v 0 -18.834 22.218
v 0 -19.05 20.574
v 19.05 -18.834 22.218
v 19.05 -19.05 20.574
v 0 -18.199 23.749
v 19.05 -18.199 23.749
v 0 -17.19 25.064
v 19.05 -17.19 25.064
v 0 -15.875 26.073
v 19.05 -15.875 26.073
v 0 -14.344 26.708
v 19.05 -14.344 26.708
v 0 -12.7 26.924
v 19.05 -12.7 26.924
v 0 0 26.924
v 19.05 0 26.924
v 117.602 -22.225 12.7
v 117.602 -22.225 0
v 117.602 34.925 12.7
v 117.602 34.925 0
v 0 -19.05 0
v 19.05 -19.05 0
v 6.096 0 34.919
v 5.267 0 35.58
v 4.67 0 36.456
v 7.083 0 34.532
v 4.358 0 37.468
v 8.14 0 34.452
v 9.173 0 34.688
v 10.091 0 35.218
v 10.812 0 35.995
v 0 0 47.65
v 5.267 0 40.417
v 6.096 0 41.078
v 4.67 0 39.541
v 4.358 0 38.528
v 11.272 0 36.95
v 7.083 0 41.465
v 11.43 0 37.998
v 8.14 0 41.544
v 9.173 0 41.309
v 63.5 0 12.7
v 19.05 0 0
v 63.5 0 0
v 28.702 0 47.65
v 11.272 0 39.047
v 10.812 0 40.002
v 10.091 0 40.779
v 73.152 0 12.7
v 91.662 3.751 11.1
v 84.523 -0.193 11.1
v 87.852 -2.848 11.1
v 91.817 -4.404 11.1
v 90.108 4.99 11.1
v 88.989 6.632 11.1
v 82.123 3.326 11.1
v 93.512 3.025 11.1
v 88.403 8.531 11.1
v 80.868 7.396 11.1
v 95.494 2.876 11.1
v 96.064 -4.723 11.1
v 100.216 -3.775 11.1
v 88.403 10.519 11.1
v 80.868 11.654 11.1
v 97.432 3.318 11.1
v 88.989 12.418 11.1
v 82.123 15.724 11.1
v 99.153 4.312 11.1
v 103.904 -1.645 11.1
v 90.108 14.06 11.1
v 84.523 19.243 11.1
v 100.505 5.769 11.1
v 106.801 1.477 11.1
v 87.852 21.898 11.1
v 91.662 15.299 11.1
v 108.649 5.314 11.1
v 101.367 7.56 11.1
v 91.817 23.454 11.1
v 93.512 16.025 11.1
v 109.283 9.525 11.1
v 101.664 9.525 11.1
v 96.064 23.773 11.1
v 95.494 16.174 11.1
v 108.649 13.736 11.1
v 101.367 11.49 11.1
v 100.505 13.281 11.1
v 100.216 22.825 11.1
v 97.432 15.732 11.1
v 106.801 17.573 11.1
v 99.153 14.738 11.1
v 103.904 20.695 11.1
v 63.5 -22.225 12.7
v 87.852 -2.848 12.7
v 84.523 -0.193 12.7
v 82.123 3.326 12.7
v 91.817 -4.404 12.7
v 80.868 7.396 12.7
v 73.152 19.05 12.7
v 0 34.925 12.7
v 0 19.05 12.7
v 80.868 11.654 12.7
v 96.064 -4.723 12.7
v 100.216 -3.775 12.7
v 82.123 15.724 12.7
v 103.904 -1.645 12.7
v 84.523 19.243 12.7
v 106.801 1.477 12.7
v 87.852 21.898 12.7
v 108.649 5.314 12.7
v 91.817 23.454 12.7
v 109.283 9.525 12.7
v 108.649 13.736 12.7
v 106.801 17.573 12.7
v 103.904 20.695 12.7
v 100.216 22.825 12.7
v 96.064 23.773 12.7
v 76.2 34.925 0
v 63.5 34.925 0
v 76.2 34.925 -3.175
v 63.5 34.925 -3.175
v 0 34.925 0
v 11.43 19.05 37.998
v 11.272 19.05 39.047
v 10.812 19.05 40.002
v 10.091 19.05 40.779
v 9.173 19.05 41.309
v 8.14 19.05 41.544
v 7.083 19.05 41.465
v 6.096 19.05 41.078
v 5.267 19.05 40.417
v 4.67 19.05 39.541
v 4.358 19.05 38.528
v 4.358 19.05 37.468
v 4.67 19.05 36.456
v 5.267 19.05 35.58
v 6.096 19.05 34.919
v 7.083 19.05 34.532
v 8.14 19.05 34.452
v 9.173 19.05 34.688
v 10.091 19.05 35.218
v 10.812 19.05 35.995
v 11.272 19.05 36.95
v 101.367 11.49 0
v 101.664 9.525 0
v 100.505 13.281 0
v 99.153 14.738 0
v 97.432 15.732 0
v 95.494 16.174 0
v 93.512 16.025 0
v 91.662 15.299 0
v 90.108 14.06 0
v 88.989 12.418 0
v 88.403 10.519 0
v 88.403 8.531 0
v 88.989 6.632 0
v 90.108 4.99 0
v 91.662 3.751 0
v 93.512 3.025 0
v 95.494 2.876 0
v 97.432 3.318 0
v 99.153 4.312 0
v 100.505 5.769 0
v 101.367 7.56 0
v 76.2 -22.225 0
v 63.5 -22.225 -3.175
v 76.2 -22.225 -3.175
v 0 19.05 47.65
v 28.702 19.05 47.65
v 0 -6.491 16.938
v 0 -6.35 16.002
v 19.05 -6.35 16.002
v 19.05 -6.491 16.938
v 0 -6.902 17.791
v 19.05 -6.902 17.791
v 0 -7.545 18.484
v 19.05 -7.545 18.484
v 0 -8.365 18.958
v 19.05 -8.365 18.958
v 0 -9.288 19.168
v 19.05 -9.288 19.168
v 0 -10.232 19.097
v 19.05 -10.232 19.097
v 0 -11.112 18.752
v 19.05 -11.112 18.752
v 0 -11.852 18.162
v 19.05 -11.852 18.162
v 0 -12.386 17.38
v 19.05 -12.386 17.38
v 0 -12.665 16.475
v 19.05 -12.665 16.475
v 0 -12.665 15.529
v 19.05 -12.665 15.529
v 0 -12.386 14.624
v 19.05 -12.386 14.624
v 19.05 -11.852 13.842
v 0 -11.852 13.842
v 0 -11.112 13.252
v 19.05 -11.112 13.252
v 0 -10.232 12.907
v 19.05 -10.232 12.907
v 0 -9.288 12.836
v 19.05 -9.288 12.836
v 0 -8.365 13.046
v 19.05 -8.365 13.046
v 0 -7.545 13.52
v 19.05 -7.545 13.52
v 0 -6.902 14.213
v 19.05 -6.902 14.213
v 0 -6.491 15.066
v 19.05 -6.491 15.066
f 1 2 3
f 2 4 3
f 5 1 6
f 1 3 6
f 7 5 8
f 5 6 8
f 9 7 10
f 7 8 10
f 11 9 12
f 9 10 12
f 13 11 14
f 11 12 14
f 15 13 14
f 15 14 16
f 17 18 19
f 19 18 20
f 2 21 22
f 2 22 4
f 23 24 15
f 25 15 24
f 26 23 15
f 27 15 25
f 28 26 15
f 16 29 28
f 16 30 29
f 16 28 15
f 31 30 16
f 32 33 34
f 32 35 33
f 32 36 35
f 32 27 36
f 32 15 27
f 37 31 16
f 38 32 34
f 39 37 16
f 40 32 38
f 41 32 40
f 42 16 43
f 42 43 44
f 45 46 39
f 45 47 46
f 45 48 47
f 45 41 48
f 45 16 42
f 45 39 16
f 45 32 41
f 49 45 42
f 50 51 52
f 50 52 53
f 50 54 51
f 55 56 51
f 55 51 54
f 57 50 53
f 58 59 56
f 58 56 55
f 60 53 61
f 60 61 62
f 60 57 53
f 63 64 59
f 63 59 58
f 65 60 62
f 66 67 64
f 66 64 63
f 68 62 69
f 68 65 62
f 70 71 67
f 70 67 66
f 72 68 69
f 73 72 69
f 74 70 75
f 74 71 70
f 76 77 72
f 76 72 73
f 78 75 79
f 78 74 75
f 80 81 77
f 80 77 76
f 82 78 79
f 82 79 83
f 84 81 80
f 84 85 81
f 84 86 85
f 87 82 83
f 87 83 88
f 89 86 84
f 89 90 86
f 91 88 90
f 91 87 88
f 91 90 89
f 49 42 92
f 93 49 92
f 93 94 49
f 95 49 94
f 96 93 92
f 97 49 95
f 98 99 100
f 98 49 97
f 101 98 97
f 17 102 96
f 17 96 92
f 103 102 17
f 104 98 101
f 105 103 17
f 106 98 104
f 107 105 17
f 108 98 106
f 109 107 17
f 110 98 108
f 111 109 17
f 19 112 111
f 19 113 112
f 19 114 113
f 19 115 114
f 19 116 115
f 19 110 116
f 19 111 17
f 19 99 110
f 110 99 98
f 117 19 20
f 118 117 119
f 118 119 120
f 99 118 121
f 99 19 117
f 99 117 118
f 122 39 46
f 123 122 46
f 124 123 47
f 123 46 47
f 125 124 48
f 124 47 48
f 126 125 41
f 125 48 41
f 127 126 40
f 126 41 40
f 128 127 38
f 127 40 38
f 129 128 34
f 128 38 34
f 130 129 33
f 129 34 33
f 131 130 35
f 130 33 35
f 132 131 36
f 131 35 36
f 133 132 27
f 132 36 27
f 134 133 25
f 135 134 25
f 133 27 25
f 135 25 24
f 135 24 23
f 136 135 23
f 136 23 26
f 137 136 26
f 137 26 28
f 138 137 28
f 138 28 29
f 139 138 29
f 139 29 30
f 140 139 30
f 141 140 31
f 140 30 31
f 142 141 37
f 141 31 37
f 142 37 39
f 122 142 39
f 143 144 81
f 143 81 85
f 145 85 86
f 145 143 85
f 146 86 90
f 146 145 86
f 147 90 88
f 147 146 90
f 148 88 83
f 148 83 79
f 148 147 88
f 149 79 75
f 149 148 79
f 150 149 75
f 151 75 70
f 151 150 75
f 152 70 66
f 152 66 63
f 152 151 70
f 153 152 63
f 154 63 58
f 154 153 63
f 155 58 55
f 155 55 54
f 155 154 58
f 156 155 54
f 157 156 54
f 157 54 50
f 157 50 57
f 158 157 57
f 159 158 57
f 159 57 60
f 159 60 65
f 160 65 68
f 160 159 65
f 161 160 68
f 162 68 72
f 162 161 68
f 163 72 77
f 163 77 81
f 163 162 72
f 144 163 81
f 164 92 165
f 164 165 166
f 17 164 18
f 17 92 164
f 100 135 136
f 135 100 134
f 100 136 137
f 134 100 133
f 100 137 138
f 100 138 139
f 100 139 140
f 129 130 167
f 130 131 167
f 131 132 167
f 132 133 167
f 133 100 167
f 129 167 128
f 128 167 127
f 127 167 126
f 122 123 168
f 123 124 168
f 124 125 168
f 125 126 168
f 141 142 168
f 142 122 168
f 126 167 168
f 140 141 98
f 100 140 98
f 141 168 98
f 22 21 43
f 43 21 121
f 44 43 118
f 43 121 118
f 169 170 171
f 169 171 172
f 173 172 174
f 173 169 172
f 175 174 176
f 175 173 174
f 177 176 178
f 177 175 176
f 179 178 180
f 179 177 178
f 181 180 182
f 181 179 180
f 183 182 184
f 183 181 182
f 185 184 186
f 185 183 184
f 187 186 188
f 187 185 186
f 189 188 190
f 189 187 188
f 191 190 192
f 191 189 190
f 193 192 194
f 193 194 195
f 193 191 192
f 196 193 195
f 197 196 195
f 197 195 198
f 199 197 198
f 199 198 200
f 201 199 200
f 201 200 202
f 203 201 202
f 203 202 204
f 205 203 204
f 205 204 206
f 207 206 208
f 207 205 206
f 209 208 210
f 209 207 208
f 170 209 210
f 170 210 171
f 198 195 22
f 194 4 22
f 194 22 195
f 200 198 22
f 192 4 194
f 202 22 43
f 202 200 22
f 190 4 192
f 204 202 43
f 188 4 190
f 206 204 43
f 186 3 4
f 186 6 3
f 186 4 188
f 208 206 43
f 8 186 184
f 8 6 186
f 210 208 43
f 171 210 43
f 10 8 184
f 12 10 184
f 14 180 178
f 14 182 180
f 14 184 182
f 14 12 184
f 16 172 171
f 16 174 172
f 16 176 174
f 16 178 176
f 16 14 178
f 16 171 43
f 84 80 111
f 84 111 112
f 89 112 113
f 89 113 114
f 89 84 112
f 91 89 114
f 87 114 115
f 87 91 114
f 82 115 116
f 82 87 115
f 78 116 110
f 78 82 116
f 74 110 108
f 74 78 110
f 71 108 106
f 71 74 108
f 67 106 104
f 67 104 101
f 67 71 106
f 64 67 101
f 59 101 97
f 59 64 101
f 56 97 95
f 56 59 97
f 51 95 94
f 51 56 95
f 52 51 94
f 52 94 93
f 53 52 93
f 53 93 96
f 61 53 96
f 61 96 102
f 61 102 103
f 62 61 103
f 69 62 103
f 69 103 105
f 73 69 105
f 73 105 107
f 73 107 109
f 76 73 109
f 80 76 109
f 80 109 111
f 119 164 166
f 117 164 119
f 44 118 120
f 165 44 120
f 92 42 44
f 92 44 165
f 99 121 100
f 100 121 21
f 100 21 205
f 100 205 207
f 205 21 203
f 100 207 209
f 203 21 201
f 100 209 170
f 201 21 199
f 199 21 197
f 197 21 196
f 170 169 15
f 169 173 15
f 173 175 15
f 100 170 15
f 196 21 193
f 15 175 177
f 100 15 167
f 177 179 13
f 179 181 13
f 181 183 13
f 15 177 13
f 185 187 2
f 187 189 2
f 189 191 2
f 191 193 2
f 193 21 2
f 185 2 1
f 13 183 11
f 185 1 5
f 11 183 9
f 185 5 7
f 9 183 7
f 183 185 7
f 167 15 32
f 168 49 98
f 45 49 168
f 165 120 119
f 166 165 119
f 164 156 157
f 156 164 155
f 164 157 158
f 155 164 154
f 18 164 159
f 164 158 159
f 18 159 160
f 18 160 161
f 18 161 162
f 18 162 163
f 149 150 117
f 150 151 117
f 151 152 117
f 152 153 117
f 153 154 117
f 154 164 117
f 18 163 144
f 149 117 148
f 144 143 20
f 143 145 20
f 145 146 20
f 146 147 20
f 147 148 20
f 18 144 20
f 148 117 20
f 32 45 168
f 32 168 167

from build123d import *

# Parameters (mm, degrees)
F0_R       = 3.556
F1_DEPTH   = 19.05
F2_W       = 19.05
F2_H       = 26.924
F2_R       = 3.175
F3_DEPTH   = 19.05
F4_R       = 6.35
F6_W       = 73.152
F6_H       = 12.7
F7_DEPTH   = 15.875
F8_R       = 14.2875
F9_DEPTH   = 12.7
F8_R_2     = 6.6675
F10_DEPTH  = 11.0998
F12_DEPTH  = 3.175
F12_FACE_W = 12.7
F12_FACE_H = 57.15
F13_DEPTH  = 15.875


with BuildPart() as f1:
    # F0 (on Front) → F1 (new body)
    with BuildSketch(Plane.XZ):
        Polygon((0, 47.6504), (0, 0), (73.152, 0), (73.152, 12.7), (28.702, 47.6504), align=None)
        with Locations((7.874, 37.9984)):
            Circle(F0_R, mode=Mode.SUBTRACT)
    extrude(amount=-F1_DEPTH)

    # F2 (on Right) → F3 (join)
    with BuildSketch(Plane.YZ):
        with Locations((-9.525, 13.462)):
            Rectangle(F2_W, F2_H)
        with Locations((-9.525, 16.002)):
            Circle(F2_R, mode=Mode.SUBTRACT)
    extrude(amount=F3_DEPTH)

    # F4
    f4_edges = [f1.edges().sort_by_distance(p)[0] for p in [
        (9.525, -19.05, 26.924),
    ]]
    fillet(f4_edges, radius=F4_R)

    # F6 (on offset) → F7 (join)
    with BuildSketch(Plane.XZ.offset(-19.05)):
        with Locations((36.576, 6.35)):
            Rectangle(F6_W, F6_H)
    extrude(amount=-F7_DEPTH)

    # F8 (on Top) → F9 (join)
    with BuildSketch(Plane.XY):
        Polygon((73.152, 34.925), (73.152, 0), (73.152, -22.225), (117.602, -22.225), (117.602, 9.525), (117.602, 34.925), align=None)
        with Locations((94.996, 9.525)):
            Circle(F8_R, mode=Mode.SUBTRACT)
    extrude(amount=F9_DEPTH)

    # F8 (on Top) → F10 (join)
    with BuildSketch(Plane.XY):
        with Locations((94.996, 9.525)):
            Circle(F8_R)
        with Locations((94.996, 9.525)):
            Circle(F8_R_2, mode=Mode.SUBTRACT)
    extrude(amount=F10_DEPTH)

    # F11 (on Top) → F12 (join)
    with BuildSketch(Plane.XY):
        Polygon((76.2, 34.925), (63.5, 34.925), (63.5, 0), (63.5, -22.225), (76.2, -22.225), align=None)
    extrude(amount=-F12_DEPTH)

    # F12_face (on face) → F13 (join)
    with BuildSketch(Plane(origin=(69.85, 6.35, -3.175), x_dir=(1, 0, 0), z_dir=(0, 0, -1))):
        Rectangle(F12_FACE_W, F12_FACE_H)
    extrude(amount=-F13_DEPTH)


solid = f1.part
